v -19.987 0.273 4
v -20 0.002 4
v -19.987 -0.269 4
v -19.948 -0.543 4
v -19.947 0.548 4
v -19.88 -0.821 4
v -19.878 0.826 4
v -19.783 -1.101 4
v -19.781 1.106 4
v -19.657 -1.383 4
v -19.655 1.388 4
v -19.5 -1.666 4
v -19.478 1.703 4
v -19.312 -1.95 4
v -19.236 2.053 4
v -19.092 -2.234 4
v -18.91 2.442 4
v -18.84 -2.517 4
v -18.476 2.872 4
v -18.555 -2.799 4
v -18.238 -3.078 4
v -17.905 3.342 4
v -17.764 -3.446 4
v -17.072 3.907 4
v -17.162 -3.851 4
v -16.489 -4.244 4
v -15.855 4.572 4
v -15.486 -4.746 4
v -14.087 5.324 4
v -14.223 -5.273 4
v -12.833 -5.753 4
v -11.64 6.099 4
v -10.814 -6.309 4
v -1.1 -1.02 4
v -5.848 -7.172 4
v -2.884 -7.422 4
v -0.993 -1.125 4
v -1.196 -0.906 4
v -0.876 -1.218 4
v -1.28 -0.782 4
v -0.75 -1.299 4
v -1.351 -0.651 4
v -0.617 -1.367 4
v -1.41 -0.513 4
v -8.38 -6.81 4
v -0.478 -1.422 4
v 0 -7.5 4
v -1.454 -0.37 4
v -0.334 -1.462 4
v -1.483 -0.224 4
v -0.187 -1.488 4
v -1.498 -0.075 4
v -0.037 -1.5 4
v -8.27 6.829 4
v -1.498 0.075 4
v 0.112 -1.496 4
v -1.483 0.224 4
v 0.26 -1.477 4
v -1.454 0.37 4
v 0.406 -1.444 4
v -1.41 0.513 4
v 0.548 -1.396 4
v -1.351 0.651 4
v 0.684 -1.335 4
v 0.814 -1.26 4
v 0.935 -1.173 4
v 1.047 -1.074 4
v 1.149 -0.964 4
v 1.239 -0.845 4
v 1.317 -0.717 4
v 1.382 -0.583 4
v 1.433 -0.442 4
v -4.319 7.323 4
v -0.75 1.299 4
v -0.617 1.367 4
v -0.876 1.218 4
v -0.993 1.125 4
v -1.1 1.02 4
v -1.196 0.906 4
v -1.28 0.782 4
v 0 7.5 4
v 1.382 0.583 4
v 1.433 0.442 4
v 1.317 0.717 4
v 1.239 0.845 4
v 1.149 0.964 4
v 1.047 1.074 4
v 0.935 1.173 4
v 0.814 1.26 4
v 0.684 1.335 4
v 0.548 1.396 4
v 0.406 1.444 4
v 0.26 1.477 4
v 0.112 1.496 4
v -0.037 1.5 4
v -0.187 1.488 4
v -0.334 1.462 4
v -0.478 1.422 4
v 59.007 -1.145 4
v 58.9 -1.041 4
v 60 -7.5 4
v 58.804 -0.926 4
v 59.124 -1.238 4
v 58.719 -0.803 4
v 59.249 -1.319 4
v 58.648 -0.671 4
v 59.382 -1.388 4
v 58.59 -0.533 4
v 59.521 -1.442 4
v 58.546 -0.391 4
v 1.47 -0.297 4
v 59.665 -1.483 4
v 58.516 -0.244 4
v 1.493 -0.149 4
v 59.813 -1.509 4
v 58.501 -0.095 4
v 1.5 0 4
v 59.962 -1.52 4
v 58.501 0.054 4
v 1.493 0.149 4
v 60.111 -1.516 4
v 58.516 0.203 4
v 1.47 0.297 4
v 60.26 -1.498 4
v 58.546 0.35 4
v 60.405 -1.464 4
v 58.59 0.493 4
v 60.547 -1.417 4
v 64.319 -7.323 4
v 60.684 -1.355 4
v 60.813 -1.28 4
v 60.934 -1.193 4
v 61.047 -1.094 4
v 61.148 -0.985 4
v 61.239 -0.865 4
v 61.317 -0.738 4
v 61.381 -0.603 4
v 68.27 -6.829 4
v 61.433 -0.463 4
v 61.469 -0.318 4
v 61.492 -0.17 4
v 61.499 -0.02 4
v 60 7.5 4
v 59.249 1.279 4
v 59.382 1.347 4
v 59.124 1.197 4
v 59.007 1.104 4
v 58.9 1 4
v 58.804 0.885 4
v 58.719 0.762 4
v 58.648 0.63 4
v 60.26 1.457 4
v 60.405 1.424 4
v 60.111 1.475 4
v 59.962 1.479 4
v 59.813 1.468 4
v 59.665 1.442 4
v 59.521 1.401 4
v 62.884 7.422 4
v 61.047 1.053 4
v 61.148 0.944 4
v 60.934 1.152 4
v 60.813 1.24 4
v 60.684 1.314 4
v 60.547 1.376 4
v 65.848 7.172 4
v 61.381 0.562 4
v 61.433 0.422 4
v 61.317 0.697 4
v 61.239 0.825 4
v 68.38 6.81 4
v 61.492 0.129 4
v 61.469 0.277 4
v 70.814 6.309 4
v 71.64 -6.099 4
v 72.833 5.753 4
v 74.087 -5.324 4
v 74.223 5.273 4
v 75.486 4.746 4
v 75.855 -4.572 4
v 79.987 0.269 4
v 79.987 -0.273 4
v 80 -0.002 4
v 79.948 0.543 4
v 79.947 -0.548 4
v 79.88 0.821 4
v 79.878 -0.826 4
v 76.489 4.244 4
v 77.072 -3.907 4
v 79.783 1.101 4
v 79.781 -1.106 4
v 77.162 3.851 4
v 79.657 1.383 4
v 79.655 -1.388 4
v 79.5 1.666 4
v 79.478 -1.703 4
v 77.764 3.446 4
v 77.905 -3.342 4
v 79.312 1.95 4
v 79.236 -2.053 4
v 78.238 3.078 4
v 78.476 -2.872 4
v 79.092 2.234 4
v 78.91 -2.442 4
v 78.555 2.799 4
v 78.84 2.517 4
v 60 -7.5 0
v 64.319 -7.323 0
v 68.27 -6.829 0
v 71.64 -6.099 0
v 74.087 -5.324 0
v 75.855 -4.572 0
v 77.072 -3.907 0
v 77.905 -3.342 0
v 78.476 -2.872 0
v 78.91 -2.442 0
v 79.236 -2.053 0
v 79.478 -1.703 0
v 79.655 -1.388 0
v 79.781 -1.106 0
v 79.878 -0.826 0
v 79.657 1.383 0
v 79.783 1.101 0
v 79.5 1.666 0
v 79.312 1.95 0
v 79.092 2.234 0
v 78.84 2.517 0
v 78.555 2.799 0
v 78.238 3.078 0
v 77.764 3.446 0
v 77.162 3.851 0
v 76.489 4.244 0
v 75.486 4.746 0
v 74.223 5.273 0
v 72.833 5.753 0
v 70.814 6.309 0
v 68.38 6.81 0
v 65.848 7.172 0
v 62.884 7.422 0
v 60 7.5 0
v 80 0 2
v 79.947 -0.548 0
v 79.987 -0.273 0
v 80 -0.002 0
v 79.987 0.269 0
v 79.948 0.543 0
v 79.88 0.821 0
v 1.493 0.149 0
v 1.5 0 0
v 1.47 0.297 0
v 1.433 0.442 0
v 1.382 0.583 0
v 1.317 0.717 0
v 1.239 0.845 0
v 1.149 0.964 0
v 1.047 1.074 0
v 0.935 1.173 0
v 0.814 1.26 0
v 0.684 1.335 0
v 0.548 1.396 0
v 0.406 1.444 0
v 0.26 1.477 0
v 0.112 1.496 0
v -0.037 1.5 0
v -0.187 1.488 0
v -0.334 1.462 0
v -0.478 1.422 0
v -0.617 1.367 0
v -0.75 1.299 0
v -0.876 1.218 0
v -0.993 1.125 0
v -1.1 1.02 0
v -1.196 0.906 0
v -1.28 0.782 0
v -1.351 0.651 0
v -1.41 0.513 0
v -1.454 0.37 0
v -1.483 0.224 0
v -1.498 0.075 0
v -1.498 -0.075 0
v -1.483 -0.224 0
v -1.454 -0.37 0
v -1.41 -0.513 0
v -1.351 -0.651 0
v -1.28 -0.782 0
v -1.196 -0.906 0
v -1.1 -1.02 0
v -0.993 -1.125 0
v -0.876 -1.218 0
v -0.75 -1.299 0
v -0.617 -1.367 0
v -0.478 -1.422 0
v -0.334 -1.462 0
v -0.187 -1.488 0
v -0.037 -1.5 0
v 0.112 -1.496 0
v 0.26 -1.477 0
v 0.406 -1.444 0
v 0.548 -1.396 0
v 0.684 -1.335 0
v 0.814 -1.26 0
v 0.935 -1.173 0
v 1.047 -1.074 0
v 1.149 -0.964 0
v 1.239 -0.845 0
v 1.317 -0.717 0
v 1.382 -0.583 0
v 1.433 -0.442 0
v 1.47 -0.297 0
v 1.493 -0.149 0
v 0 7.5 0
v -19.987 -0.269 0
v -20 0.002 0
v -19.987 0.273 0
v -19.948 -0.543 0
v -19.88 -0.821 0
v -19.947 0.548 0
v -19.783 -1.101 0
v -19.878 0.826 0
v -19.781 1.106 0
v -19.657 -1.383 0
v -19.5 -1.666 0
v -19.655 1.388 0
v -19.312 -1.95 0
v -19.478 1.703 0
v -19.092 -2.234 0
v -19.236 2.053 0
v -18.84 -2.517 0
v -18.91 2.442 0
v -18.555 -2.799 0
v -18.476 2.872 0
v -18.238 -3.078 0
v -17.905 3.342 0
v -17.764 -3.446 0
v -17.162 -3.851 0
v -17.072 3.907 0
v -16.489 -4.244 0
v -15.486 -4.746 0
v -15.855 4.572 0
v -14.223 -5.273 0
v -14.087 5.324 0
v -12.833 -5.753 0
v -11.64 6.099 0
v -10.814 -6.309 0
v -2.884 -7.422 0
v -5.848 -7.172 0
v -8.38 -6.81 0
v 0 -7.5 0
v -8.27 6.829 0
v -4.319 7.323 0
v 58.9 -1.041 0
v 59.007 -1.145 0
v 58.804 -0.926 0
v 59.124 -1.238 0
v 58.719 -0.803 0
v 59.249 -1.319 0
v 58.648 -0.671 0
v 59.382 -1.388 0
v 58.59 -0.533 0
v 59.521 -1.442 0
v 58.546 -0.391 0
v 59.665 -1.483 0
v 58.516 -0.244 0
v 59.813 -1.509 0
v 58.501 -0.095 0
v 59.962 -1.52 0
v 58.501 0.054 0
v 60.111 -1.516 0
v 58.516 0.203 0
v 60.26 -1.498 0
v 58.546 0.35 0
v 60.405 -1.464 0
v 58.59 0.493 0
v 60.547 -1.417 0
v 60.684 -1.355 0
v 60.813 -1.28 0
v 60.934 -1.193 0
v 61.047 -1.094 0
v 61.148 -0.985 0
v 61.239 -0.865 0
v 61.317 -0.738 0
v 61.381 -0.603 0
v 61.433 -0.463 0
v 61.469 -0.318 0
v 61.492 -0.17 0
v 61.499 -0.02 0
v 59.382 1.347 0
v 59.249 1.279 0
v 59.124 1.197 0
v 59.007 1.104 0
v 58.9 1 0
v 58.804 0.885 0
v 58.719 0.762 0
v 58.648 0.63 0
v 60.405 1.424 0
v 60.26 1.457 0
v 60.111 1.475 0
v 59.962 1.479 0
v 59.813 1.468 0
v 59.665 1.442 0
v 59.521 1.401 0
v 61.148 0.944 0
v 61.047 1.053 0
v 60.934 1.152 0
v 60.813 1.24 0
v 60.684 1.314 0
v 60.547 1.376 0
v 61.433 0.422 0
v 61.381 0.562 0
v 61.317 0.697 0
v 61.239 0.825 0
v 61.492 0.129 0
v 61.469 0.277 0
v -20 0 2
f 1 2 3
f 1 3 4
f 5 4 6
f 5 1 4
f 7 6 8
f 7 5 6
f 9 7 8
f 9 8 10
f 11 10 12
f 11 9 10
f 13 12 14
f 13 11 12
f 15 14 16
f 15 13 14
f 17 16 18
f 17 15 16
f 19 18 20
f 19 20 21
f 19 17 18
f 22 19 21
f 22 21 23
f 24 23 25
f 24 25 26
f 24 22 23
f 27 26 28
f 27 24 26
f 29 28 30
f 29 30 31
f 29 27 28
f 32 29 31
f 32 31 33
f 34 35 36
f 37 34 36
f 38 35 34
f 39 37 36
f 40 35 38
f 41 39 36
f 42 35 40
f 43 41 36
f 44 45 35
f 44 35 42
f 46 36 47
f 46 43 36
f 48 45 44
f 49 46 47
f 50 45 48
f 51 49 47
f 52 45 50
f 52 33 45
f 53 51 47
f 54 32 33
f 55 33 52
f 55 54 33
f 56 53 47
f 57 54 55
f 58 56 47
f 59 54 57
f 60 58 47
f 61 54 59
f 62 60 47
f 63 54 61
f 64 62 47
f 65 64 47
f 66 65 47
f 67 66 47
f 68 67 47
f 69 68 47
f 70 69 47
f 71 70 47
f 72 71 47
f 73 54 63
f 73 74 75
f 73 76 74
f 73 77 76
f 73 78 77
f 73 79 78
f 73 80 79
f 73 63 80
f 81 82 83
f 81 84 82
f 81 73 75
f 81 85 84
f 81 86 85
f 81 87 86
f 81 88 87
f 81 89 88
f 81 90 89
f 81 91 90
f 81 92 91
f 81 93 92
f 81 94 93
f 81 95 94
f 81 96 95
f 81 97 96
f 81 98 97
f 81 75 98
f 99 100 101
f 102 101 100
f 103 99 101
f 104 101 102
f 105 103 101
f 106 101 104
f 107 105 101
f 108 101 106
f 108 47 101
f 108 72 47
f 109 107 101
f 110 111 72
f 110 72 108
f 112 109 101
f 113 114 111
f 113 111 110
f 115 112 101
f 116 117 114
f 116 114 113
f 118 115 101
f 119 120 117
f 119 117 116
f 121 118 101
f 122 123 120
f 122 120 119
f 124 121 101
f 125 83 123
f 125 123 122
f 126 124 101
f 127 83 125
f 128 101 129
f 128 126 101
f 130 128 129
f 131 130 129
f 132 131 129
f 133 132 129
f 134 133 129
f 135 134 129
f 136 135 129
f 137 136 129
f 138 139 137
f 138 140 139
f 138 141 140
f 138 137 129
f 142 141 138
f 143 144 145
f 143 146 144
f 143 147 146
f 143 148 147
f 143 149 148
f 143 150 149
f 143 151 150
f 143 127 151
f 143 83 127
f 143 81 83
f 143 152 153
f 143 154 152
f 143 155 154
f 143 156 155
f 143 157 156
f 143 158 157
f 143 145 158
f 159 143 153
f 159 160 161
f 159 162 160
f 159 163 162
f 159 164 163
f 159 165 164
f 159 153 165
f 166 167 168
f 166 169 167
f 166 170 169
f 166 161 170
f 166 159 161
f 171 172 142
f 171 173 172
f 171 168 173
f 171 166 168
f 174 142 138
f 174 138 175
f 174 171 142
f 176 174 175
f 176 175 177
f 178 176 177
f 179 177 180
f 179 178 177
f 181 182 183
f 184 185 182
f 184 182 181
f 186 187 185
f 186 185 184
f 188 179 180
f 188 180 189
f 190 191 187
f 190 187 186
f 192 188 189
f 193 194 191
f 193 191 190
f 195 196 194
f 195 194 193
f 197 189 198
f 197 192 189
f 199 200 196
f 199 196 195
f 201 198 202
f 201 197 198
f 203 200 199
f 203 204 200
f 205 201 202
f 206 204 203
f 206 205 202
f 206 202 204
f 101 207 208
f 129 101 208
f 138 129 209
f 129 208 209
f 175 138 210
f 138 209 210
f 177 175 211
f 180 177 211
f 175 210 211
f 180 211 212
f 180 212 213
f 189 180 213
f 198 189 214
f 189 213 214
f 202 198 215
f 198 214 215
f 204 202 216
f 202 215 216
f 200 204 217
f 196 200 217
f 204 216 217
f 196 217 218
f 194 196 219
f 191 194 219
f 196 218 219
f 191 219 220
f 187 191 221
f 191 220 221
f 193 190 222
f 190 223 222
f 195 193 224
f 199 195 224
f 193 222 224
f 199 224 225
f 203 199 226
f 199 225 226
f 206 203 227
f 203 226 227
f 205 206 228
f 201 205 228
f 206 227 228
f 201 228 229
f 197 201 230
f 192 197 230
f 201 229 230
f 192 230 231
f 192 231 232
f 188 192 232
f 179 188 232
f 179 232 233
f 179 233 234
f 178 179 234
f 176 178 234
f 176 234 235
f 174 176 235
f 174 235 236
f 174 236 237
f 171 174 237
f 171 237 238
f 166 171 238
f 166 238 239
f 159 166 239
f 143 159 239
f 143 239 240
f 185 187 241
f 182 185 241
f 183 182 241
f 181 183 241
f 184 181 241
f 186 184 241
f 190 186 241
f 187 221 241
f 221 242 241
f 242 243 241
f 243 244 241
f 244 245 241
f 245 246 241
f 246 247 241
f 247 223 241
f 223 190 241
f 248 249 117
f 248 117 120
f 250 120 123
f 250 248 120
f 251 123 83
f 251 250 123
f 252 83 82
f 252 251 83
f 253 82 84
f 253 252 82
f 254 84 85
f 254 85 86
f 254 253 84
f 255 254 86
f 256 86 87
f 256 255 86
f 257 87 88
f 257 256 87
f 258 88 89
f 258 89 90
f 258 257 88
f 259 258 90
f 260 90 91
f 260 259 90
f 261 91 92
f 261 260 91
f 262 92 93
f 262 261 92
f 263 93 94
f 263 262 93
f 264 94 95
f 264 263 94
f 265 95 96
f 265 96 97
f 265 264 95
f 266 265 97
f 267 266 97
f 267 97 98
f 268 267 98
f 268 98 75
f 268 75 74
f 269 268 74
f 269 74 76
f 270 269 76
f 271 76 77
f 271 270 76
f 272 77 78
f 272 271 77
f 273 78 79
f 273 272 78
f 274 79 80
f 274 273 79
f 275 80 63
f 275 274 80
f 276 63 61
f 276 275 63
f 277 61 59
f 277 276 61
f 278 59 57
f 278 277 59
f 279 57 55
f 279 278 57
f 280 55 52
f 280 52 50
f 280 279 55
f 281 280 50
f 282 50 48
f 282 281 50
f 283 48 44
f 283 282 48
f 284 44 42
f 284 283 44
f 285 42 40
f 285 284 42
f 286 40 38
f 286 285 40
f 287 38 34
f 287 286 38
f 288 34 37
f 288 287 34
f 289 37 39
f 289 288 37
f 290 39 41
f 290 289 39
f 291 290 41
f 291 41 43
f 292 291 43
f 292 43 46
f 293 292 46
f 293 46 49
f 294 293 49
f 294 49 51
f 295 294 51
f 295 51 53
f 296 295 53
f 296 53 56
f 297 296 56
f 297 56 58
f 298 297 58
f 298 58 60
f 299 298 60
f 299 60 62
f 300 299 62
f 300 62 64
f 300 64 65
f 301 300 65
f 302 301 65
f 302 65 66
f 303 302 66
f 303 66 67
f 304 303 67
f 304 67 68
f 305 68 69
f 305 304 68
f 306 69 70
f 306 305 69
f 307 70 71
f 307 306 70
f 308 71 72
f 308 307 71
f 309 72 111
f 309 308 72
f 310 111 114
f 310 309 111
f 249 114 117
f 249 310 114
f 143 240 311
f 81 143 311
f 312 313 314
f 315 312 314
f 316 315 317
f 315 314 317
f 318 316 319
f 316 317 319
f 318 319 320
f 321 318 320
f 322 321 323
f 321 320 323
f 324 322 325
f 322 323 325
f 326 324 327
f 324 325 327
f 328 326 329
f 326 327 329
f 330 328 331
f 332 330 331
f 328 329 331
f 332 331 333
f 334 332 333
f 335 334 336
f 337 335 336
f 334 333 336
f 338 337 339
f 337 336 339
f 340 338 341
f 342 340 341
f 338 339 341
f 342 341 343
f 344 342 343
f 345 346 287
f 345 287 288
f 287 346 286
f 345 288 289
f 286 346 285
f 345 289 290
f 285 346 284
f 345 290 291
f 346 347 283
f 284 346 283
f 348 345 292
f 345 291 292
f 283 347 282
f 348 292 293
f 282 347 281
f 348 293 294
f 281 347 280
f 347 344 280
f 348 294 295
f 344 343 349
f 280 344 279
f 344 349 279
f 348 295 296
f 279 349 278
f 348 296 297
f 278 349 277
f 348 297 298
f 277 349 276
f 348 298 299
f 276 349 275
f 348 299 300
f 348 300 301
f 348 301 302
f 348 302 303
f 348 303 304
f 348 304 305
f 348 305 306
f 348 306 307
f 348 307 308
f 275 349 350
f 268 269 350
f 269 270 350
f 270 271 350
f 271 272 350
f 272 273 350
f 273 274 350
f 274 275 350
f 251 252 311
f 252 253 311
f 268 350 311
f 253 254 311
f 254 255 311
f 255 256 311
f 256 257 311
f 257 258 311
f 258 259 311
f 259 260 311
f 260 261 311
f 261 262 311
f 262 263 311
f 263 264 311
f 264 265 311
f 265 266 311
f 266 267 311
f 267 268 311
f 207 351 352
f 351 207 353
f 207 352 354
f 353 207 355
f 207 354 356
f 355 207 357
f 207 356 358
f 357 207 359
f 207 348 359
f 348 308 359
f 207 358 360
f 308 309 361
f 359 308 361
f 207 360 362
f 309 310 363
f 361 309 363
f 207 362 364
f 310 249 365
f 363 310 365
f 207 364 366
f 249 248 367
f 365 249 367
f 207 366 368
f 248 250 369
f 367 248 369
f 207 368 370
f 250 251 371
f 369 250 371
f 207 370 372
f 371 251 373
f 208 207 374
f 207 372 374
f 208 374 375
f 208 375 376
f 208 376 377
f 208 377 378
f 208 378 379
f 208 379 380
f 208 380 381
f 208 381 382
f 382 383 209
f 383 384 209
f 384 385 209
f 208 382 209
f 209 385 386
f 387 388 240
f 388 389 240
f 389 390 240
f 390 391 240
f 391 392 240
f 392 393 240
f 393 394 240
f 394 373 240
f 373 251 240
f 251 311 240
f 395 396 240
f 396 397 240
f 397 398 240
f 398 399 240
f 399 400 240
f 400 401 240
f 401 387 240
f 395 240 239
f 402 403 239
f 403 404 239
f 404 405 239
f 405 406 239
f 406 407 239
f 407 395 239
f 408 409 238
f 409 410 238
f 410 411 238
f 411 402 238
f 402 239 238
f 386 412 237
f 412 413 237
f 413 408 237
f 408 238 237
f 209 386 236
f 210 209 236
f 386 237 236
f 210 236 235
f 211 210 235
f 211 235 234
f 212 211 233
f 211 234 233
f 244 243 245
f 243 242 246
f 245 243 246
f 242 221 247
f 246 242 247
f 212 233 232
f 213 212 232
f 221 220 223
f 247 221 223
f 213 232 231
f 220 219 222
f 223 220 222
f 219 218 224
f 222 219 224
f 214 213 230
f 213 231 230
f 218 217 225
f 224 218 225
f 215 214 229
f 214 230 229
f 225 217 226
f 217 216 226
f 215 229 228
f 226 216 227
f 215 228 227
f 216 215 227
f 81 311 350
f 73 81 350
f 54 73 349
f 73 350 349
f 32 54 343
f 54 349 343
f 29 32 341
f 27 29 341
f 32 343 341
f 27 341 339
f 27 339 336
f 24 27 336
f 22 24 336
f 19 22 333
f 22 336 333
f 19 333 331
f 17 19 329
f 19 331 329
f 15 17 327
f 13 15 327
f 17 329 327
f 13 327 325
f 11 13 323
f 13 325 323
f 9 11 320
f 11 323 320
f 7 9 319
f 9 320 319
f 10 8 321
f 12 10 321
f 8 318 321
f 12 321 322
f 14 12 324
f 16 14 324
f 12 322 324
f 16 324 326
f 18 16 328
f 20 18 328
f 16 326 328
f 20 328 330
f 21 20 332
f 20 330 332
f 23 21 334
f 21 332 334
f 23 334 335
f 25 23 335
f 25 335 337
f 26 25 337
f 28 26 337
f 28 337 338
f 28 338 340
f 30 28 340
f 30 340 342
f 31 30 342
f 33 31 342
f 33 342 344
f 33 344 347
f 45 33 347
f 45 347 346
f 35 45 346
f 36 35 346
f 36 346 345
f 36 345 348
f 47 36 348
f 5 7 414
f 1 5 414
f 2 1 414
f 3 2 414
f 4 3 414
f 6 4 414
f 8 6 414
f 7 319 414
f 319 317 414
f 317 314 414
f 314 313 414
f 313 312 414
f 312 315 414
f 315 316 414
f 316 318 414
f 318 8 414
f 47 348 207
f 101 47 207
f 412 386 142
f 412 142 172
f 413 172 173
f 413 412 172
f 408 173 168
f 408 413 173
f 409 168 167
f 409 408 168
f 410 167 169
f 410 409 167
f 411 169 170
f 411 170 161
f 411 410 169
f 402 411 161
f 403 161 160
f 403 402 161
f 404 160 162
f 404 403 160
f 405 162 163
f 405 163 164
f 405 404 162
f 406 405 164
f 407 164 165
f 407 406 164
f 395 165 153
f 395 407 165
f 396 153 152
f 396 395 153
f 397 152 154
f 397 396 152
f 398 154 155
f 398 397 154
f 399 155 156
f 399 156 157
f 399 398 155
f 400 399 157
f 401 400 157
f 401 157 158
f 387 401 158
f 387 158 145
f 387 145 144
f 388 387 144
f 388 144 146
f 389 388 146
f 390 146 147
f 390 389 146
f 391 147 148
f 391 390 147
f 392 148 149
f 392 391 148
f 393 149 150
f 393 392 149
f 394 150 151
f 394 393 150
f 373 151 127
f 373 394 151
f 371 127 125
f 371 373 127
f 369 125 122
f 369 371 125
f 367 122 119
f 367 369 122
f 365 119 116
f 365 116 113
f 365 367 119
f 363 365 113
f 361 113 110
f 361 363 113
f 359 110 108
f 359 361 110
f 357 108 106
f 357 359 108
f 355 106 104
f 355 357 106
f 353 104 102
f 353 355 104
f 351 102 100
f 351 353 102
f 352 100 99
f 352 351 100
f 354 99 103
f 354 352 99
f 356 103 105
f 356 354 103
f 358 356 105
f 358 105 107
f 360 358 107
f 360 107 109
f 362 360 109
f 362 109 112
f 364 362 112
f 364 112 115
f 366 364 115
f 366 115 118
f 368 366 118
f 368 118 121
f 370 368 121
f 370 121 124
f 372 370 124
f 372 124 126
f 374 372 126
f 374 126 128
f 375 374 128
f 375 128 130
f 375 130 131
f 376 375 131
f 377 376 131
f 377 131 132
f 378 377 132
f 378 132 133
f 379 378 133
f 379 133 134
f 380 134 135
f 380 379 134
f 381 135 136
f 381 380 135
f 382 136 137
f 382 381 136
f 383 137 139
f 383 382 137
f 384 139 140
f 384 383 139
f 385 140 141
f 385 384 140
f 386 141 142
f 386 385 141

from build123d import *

# Parameters (mm, degrees)
SKETCH_R  = 1.5
PAD_DEPTH = 4


with BuildPart() as part:
    # Sketch → Pad (new body)
    with BuildSketch(Plane.XY):
        with BuildLine():
            add(Edge.make_bspline(
                [(0, 7.5), (-20, 7.5), (-20, 0), (-20, -7.5), (0, -7.5)],
                knots=[4.712389, 4.712389, 4.712389, 6.283185, 6.283185, 7.853982, 7.853982, 7.853982], degree=2, weights=[1, 0.707107, 1, 0.707107, 1]))
            Line((0, -7.5), (60.000001, -7.5))
            add(Edge.make_bspline(
                [(60.000001, -7.5), (80, -7.5), (80, 0), (80, 7.5), (60, 7.5)],
                knots=[4.712389, 4.712389, 4.712389, 6.283185, 6.283185, 7.853982, 7.853982, 7.853982], degree=2, weights=[1, 0.707107, 1, 0.707107, 1]))
            Line((60, 7.5), (0, 7.5))
        make_face()
        with Locations((59.999199, -0.020412)):
            Circle(SKETCH_R, mode=Mode.SUBTRACT)
        Circle(SKETCH_R, mode=Mode.SUBTRACT)
    extrude(amount=PAD_DEPTH)


solid = part.part
